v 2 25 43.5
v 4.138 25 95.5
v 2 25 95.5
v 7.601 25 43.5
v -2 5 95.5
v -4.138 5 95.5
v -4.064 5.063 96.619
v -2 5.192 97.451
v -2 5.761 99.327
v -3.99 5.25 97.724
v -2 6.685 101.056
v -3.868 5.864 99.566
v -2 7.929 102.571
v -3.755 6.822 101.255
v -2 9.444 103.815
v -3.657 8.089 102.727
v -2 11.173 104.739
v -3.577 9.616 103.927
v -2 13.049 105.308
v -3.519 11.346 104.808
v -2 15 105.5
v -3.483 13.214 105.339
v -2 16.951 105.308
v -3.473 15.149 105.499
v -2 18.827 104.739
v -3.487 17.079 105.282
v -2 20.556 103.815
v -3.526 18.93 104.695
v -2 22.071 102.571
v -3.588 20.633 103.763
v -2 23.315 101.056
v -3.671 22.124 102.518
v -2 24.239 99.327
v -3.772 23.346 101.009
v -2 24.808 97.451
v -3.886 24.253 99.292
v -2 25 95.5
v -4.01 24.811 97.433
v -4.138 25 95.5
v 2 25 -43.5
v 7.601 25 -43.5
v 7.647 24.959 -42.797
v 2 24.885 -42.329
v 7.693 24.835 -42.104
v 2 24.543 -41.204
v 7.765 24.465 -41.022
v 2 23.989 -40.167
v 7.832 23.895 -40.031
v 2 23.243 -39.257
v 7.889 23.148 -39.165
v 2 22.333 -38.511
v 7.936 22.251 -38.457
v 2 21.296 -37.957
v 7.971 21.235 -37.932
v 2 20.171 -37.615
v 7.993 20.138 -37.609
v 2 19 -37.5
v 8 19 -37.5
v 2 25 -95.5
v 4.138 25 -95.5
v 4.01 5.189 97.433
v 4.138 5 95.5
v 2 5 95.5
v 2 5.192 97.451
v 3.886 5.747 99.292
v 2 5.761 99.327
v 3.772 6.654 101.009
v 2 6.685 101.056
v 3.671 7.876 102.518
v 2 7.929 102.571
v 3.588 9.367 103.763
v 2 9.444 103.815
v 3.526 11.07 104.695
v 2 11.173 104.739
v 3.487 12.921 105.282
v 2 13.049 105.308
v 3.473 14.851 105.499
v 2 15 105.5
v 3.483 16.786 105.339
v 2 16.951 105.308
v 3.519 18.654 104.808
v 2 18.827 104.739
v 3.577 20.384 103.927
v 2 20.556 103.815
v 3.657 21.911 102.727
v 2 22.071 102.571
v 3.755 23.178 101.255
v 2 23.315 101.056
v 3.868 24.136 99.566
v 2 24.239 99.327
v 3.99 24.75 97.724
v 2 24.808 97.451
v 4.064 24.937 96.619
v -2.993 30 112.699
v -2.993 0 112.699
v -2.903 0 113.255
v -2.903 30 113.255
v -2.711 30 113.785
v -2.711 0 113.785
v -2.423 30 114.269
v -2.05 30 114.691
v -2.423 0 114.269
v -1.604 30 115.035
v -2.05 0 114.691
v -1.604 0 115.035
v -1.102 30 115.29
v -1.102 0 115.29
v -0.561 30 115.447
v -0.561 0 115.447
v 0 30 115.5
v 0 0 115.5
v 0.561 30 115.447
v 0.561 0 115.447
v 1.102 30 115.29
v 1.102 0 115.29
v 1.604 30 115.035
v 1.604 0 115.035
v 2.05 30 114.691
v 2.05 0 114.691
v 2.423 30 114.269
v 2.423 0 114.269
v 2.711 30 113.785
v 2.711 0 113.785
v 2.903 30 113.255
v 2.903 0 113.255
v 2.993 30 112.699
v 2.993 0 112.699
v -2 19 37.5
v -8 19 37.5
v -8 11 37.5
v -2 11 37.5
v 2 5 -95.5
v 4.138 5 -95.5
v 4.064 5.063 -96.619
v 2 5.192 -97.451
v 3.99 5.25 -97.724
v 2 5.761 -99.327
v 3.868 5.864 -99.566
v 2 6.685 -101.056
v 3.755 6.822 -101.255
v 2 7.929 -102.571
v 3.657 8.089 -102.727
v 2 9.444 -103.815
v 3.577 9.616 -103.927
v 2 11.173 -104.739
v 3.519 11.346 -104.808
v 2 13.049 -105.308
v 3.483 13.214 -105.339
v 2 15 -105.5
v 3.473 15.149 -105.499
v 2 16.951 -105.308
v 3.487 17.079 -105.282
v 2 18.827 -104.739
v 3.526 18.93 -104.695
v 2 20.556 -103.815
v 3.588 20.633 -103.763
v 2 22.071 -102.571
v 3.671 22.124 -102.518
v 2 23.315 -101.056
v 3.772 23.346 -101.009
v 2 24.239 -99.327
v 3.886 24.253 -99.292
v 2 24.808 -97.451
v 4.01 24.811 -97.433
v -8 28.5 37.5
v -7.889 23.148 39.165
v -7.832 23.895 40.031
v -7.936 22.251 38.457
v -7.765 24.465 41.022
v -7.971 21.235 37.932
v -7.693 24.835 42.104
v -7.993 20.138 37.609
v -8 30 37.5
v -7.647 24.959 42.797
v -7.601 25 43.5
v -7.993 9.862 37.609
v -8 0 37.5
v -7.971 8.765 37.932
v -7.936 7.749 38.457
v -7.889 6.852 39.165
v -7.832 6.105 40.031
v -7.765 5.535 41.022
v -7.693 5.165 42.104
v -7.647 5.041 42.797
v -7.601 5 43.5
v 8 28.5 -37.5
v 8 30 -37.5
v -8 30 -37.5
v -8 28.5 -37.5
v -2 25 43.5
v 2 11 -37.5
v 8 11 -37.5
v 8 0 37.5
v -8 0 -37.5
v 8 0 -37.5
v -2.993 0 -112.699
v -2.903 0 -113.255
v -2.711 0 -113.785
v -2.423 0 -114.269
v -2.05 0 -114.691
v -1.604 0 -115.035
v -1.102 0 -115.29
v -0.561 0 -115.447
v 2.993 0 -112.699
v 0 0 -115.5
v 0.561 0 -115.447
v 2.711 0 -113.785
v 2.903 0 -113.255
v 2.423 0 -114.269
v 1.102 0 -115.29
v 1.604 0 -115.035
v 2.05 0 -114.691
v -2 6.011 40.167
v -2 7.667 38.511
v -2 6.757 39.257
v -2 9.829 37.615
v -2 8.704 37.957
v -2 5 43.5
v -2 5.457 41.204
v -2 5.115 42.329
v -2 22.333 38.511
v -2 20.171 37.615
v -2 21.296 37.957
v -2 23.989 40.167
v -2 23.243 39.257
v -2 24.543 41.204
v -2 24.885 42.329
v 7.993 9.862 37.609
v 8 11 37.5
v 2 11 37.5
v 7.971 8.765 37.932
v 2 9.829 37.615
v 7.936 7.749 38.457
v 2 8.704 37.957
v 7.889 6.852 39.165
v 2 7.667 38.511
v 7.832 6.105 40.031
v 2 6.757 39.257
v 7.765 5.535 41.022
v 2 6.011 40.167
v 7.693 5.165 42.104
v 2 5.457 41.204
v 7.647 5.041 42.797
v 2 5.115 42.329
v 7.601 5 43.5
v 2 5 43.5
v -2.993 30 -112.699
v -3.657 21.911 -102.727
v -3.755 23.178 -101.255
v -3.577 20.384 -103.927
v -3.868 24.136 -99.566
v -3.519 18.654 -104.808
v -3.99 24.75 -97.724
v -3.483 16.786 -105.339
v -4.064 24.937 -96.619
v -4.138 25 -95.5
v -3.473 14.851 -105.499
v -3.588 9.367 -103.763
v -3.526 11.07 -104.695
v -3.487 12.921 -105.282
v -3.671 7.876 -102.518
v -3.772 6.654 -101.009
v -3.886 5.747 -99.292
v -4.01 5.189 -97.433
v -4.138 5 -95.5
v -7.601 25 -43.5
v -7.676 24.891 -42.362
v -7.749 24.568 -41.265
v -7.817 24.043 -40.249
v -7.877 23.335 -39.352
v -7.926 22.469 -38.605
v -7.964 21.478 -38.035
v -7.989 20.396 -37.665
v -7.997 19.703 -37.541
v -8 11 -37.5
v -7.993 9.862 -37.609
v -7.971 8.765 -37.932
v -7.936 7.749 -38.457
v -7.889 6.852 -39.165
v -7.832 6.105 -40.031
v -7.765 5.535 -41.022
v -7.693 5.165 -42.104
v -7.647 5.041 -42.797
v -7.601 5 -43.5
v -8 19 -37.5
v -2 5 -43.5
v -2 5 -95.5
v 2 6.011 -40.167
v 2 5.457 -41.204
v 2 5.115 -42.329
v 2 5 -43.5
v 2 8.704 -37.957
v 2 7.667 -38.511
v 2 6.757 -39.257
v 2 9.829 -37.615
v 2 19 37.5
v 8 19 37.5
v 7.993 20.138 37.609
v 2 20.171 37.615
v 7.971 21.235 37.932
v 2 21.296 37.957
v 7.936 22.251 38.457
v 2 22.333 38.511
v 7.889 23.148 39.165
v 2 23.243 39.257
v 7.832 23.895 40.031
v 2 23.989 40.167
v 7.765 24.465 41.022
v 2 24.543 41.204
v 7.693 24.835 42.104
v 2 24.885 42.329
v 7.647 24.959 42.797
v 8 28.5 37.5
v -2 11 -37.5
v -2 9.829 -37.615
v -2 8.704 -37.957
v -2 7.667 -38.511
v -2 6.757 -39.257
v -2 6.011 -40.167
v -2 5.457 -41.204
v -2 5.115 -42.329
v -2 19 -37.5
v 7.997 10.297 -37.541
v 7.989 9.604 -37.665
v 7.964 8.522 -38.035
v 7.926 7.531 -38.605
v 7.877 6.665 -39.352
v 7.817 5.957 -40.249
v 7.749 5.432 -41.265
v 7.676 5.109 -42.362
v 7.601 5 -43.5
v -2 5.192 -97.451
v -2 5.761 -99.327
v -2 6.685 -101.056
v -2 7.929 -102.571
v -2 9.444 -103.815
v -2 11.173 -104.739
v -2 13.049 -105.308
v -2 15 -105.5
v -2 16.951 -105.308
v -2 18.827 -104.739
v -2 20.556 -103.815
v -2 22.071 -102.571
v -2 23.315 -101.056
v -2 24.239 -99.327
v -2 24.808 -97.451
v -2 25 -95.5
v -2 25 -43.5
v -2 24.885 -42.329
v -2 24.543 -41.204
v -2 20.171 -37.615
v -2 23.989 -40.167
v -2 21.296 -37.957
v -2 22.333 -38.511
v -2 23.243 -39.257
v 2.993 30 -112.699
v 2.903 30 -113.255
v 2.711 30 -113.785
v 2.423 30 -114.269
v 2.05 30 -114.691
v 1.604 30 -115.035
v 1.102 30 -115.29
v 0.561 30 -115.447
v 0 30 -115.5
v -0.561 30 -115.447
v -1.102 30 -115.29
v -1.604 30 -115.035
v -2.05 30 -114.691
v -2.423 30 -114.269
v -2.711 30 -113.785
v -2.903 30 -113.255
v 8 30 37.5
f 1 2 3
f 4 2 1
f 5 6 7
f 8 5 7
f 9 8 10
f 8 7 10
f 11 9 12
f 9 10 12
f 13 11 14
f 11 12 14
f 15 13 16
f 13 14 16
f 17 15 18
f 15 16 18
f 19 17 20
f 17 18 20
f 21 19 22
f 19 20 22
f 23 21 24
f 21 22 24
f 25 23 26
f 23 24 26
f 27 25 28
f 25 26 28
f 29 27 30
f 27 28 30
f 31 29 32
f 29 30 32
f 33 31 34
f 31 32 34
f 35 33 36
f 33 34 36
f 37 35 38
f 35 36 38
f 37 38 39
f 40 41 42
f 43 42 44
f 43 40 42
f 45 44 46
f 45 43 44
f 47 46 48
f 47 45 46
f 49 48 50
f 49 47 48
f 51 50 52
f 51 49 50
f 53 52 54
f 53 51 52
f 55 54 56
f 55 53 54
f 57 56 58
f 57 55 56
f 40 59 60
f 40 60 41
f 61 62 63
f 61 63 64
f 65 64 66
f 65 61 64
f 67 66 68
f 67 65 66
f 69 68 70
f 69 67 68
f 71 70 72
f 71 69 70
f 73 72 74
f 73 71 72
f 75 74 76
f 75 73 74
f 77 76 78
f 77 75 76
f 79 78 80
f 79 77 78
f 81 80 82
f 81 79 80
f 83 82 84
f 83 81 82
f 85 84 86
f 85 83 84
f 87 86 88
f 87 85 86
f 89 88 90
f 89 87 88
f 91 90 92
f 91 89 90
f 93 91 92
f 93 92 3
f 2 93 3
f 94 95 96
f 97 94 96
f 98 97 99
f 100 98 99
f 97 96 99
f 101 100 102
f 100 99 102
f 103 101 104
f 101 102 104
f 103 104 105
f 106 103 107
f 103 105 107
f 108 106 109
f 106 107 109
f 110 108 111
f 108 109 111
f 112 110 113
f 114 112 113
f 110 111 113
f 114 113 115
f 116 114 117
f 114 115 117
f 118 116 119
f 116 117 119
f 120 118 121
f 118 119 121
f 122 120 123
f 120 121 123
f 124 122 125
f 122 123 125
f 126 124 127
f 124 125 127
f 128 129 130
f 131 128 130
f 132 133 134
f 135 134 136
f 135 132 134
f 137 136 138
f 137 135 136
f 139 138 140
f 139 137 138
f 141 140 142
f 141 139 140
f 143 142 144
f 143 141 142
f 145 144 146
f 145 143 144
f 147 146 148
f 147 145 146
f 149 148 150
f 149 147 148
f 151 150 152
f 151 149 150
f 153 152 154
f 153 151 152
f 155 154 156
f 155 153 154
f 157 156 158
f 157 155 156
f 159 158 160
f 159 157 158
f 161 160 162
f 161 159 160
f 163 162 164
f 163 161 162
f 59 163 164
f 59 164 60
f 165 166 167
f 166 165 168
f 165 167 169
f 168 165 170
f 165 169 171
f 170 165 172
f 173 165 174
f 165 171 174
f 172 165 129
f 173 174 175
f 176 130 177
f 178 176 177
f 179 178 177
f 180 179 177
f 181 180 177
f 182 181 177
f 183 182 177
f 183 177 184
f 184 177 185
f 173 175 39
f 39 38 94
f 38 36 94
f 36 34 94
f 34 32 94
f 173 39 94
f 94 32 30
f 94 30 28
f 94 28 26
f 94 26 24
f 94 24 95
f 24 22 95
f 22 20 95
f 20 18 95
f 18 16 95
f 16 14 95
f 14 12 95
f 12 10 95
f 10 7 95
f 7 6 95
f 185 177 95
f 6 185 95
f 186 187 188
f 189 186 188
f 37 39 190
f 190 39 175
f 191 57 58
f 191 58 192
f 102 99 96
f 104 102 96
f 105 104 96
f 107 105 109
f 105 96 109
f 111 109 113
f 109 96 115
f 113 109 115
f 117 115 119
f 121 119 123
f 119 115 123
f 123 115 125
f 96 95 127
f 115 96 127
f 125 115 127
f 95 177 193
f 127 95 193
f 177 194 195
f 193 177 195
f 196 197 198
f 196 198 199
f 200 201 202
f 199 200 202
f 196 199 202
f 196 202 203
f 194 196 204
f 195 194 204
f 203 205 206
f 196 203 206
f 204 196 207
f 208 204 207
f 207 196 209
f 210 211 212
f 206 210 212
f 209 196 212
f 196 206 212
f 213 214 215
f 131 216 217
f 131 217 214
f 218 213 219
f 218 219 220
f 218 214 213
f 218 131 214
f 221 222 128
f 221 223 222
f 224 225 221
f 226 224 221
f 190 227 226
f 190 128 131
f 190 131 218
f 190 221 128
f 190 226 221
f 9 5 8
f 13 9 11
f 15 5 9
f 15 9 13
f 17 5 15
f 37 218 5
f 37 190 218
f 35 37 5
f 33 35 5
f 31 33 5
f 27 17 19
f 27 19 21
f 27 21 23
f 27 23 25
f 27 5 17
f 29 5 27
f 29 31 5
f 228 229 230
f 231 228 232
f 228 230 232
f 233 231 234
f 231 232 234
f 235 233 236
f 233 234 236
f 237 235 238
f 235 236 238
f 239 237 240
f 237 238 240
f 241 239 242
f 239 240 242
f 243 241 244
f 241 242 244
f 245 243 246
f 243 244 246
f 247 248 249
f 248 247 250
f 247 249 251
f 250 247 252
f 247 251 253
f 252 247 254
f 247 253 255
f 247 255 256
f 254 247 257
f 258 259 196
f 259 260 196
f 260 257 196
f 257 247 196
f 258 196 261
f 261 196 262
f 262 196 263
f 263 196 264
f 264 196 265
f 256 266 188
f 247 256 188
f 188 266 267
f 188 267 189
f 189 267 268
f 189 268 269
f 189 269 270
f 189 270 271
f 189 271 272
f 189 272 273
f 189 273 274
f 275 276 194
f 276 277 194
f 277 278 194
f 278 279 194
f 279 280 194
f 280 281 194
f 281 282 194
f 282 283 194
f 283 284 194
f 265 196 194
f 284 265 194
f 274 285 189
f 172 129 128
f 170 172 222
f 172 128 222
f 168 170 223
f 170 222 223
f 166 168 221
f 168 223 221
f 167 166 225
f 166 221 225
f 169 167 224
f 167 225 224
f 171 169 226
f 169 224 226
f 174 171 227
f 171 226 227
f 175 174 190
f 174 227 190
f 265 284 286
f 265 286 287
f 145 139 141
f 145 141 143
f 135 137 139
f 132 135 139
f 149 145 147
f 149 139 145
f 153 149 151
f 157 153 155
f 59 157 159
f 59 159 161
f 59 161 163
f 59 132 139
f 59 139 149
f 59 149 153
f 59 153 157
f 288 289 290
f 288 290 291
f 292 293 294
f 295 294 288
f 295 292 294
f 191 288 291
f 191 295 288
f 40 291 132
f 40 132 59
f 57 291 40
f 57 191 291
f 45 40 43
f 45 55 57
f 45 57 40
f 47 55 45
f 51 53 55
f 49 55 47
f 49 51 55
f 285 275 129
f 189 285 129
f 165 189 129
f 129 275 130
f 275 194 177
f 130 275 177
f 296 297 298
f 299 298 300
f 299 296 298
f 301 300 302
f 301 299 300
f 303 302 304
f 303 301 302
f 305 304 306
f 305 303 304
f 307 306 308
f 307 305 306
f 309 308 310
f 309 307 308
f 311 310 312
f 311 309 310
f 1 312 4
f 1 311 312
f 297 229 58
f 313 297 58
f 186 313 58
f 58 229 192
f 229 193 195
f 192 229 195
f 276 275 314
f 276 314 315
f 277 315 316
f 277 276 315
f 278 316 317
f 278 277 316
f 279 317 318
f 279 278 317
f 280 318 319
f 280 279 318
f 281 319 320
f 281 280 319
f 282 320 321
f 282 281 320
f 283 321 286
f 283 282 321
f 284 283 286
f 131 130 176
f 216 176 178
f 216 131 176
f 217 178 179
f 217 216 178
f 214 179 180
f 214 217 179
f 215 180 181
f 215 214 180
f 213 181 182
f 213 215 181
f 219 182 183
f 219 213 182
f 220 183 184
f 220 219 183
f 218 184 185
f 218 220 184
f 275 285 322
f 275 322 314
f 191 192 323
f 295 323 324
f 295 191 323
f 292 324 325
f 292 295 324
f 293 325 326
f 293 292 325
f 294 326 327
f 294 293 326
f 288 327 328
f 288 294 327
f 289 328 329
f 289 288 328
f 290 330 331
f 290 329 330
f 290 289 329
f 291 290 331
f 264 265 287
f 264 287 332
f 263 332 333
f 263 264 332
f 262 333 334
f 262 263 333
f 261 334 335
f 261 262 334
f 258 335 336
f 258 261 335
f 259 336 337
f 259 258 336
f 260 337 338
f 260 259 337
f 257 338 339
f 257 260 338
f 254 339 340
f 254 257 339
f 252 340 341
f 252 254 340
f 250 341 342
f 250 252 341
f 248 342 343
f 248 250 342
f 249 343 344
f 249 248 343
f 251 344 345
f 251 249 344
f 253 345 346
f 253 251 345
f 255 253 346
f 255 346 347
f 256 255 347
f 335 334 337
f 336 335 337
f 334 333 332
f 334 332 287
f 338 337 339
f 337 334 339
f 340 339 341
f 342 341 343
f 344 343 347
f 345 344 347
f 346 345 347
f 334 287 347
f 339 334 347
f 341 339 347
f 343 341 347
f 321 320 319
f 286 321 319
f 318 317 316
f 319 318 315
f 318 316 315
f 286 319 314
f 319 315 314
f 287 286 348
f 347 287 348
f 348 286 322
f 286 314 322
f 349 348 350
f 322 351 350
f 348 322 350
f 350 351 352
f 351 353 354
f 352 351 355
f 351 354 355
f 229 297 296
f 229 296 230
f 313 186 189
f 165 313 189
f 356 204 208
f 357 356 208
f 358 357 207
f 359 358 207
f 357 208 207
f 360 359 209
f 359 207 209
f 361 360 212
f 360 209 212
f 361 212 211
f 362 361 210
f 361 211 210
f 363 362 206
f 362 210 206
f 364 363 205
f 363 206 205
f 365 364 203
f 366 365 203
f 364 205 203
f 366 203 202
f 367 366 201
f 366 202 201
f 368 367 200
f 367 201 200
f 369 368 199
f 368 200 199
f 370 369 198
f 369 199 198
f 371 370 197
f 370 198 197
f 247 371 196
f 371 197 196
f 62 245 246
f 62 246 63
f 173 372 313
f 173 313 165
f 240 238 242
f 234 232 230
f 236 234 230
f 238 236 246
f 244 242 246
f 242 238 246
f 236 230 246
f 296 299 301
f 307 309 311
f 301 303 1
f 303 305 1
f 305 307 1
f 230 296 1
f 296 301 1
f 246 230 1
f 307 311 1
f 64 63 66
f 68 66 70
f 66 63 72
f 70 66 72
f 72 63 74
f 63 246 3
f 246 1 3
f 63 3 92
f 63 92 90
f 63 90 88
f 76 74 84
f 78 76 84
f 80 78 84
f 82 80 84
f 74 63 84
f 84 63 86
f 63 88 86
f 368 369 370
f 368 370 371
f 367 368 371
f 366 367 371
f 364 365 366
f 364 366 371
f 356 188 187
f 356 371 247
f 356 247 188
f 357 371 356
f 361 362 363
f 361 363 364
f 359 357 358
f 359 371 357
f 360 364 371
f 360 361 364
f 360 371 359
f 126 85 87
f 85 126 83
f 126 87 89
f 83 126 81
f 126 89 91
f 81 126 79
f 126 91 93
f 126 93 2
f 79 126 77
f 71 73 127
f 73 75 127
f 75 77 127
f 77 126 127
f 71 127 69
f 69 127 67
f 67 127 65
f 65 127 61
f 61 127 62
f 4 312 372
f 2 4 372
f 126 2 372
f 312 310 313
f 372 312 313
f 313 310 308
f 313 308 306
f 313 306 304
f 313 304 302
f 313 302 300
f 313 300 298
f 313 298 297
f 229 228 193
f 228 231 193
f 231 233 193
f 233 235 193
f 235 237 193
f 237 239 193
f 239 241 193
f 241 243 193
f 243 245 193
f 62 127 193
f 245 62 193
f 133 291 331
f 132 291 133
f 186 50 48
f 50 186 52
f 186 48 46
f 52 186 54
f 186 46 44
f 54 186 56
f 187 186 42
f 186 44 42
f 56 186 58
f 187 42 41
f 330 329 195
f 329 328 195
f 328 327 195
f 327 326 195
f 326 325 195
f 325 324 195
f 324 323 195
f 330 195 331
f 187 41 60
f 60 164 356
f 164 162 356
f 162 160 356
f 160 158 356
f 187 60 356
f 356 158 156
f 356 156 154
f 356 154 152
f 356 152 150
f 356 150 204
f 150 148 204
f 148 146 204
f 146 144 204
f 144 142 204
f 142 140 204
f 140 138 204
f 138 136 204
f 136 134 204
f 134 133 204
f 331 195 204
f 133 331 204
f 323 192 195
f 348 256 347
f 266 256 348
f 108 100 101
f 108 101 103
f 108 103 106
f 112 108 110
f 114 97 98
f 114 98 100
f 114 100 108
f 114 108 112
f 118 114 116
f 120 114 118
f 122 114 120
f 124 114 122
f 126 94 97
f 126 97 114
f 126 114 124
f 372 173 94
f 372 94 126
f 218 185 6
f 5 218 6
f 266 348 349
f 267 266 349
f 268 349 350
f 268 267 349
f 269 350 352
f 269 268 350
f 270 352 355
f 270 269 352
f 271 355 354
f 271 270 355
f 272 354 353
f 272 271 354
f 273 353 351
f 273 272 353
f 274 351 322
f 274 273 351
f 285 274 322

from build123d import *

# Parameters (mm, degrees)
BASE_EXTRUDE_DEPTH   = 30
CUT_EXTRUDE1_DEPTH   = 6
FILLET1_R            = 6
FILLET1_OF_MIRROR1_R = 6
MIRROR2_START        = -8
MIRROR2_DEPTH        = 6
MIRROR2_START_2      = 2
MIRROR2_2_DEPTH      = 6
SKETCH5_W            = 16
SKETCH5_H            = 75
CUT_EXTRUDE3_DEPTH   = 1.5


# Read off the part's stored shape, not the designer's step: Mirror2
with BuildPart() as part:
    # Sketch1 → Base-Extrude (new body)
    with BuildSketch(Plane(origin=(0, 0, 0), x_dir=(1, 0, 0), z_dir=(0, 1, 0))):
        with BuildLine():
            Line((8, 37.5), (2.993373056, 112.699293126))
            ThreePointArc((2.993373056, 112.699293126), (0, 115.5), (-2.993373056, 112.699293126))
            Line((-2.993373056, 112.699293126), (-8, 37.5))
            Line((-8, 37.5), (-8, -37.5))
            Line((-8, -37.5), (-2.993373056, -112.699293126))
            ThreePointArc((-2.993373056, -112.699293126), (0, -115.5), (2.993373056, -112.699293126))
            Line((2.993373056, -112.699293126), (8, -37.5))
            Line((8, -37.5), (8, 37.5))
        make_face()
    extrude(amount=BASE_EXTRUDE_DEPTH)

    # Sketch2 → Cut-Extrude1 (cut)
    with BuildSketch(Plane(origin=(8, 0, 0), x_dir=(0, 0, -1), z_dir=(1, 0, 0))):
        with BuildLine():
            Line((-37.5, 5), (-95.5, 5))
            ThreePointArc((-95.5, 5), (-105.5, 15), (-95.5, 25))
            Line((-95.5, 25), (-37.5, 25))
            Line((-37.5, 25), (-37.5, 5))
        make_face()
    cut_extrude1 = extrude(amount=-CUT_EXTRUDE1_DEPTH, mode=Mode.SUBTRACT)

    # Fillet1
    fillet1_edges = [part.edges().sort_by_distance(p)[0] for p in [
        (5, 25, 37.5),
        (5, 5, 37.5),
    ]]
    fillet(fillet1_edges, radius=FILLET1_R)

    # Mirror1: Cut-Extrude1 across plane
    add(cut_extrude1.mirror(Plane(origin=(0, 0, 0), x_dir=(0, 0, 1), z_dir=(1, 0, 0))), mode=Mode.SUBTRACT)

    # Fillet1 of Mirror1
    fillet1_of_mirror1_edges = [part.edges().sort_by_distance(p)[0] for p in [
        (-5, 25, 37.5),
        (-5, 5, 37.5),
    ]]
    fillet(fillet1_of_mirror1_edges, radius=FILLET1_OF_MIRROR1_R)

    # Mirror2 outline → Mirror2 (cut)
    with BuildSketch(Plane.YZ.offset(MIRROR2_START)):
        with BuildLine():
            Line((5, -43.5), (5, -95.5))
            ThreePointArc((5, -95.5), (15, -105.5), (25, -95.5))
            Line((25, -95.5), (25, -43.5))
            ThreePointArc((25, -43.5), (23.242640687, -39.257359313), (19, -37.5))
            Line((19, -37.5), (11, -37.5))
            ThreePointArc((11, -37.5), (6.757359313, -39.257359313), (5, -43.5))
        make_face()
    extrude(amount=MIRROR2_DEPTH, mode=Mode.SUBTRACT)

    # Mirror2 2 outline → Mirror2 2 (cut)
    with BuildSketch(Plane.YZ.offset(MIRROR2_START_2)):
        with BuildLine():
            Line((5, -43.5), (5, -95.5))
            ThreePointArc((5, -95.5), (15, -105.5), (25, -95.5))
            Line((25, -95.5), (25, -43.5))
            ThreePointArc((25, -43.5), (23.242640687, -39.257359313), (19, -37.5))
            Line((19, -37.5), (11, -37.5))
            ThreePointArc((11, -37.5), (6.757359313, -39.257359313), (5, -43.5))
        make_face()
    extrude(amount=MIRROR2_2_DEPTH, mode=Mode.SUBTRACT)

    # Sketch5 → Cut-Extrude3 (cut)
    with BuildSketch(Plane(origin=(0, 30, 0), x_dir=(-1, 0, 0), z_dir=(0, 1, 0))):
        Rectangle(SKETCH5_W, SKETCH5_H)
    extrude(amount=-CUT_EXTRUDE3_DEPTH, mode=Mode.SUBTRACT)


solid = part.part
